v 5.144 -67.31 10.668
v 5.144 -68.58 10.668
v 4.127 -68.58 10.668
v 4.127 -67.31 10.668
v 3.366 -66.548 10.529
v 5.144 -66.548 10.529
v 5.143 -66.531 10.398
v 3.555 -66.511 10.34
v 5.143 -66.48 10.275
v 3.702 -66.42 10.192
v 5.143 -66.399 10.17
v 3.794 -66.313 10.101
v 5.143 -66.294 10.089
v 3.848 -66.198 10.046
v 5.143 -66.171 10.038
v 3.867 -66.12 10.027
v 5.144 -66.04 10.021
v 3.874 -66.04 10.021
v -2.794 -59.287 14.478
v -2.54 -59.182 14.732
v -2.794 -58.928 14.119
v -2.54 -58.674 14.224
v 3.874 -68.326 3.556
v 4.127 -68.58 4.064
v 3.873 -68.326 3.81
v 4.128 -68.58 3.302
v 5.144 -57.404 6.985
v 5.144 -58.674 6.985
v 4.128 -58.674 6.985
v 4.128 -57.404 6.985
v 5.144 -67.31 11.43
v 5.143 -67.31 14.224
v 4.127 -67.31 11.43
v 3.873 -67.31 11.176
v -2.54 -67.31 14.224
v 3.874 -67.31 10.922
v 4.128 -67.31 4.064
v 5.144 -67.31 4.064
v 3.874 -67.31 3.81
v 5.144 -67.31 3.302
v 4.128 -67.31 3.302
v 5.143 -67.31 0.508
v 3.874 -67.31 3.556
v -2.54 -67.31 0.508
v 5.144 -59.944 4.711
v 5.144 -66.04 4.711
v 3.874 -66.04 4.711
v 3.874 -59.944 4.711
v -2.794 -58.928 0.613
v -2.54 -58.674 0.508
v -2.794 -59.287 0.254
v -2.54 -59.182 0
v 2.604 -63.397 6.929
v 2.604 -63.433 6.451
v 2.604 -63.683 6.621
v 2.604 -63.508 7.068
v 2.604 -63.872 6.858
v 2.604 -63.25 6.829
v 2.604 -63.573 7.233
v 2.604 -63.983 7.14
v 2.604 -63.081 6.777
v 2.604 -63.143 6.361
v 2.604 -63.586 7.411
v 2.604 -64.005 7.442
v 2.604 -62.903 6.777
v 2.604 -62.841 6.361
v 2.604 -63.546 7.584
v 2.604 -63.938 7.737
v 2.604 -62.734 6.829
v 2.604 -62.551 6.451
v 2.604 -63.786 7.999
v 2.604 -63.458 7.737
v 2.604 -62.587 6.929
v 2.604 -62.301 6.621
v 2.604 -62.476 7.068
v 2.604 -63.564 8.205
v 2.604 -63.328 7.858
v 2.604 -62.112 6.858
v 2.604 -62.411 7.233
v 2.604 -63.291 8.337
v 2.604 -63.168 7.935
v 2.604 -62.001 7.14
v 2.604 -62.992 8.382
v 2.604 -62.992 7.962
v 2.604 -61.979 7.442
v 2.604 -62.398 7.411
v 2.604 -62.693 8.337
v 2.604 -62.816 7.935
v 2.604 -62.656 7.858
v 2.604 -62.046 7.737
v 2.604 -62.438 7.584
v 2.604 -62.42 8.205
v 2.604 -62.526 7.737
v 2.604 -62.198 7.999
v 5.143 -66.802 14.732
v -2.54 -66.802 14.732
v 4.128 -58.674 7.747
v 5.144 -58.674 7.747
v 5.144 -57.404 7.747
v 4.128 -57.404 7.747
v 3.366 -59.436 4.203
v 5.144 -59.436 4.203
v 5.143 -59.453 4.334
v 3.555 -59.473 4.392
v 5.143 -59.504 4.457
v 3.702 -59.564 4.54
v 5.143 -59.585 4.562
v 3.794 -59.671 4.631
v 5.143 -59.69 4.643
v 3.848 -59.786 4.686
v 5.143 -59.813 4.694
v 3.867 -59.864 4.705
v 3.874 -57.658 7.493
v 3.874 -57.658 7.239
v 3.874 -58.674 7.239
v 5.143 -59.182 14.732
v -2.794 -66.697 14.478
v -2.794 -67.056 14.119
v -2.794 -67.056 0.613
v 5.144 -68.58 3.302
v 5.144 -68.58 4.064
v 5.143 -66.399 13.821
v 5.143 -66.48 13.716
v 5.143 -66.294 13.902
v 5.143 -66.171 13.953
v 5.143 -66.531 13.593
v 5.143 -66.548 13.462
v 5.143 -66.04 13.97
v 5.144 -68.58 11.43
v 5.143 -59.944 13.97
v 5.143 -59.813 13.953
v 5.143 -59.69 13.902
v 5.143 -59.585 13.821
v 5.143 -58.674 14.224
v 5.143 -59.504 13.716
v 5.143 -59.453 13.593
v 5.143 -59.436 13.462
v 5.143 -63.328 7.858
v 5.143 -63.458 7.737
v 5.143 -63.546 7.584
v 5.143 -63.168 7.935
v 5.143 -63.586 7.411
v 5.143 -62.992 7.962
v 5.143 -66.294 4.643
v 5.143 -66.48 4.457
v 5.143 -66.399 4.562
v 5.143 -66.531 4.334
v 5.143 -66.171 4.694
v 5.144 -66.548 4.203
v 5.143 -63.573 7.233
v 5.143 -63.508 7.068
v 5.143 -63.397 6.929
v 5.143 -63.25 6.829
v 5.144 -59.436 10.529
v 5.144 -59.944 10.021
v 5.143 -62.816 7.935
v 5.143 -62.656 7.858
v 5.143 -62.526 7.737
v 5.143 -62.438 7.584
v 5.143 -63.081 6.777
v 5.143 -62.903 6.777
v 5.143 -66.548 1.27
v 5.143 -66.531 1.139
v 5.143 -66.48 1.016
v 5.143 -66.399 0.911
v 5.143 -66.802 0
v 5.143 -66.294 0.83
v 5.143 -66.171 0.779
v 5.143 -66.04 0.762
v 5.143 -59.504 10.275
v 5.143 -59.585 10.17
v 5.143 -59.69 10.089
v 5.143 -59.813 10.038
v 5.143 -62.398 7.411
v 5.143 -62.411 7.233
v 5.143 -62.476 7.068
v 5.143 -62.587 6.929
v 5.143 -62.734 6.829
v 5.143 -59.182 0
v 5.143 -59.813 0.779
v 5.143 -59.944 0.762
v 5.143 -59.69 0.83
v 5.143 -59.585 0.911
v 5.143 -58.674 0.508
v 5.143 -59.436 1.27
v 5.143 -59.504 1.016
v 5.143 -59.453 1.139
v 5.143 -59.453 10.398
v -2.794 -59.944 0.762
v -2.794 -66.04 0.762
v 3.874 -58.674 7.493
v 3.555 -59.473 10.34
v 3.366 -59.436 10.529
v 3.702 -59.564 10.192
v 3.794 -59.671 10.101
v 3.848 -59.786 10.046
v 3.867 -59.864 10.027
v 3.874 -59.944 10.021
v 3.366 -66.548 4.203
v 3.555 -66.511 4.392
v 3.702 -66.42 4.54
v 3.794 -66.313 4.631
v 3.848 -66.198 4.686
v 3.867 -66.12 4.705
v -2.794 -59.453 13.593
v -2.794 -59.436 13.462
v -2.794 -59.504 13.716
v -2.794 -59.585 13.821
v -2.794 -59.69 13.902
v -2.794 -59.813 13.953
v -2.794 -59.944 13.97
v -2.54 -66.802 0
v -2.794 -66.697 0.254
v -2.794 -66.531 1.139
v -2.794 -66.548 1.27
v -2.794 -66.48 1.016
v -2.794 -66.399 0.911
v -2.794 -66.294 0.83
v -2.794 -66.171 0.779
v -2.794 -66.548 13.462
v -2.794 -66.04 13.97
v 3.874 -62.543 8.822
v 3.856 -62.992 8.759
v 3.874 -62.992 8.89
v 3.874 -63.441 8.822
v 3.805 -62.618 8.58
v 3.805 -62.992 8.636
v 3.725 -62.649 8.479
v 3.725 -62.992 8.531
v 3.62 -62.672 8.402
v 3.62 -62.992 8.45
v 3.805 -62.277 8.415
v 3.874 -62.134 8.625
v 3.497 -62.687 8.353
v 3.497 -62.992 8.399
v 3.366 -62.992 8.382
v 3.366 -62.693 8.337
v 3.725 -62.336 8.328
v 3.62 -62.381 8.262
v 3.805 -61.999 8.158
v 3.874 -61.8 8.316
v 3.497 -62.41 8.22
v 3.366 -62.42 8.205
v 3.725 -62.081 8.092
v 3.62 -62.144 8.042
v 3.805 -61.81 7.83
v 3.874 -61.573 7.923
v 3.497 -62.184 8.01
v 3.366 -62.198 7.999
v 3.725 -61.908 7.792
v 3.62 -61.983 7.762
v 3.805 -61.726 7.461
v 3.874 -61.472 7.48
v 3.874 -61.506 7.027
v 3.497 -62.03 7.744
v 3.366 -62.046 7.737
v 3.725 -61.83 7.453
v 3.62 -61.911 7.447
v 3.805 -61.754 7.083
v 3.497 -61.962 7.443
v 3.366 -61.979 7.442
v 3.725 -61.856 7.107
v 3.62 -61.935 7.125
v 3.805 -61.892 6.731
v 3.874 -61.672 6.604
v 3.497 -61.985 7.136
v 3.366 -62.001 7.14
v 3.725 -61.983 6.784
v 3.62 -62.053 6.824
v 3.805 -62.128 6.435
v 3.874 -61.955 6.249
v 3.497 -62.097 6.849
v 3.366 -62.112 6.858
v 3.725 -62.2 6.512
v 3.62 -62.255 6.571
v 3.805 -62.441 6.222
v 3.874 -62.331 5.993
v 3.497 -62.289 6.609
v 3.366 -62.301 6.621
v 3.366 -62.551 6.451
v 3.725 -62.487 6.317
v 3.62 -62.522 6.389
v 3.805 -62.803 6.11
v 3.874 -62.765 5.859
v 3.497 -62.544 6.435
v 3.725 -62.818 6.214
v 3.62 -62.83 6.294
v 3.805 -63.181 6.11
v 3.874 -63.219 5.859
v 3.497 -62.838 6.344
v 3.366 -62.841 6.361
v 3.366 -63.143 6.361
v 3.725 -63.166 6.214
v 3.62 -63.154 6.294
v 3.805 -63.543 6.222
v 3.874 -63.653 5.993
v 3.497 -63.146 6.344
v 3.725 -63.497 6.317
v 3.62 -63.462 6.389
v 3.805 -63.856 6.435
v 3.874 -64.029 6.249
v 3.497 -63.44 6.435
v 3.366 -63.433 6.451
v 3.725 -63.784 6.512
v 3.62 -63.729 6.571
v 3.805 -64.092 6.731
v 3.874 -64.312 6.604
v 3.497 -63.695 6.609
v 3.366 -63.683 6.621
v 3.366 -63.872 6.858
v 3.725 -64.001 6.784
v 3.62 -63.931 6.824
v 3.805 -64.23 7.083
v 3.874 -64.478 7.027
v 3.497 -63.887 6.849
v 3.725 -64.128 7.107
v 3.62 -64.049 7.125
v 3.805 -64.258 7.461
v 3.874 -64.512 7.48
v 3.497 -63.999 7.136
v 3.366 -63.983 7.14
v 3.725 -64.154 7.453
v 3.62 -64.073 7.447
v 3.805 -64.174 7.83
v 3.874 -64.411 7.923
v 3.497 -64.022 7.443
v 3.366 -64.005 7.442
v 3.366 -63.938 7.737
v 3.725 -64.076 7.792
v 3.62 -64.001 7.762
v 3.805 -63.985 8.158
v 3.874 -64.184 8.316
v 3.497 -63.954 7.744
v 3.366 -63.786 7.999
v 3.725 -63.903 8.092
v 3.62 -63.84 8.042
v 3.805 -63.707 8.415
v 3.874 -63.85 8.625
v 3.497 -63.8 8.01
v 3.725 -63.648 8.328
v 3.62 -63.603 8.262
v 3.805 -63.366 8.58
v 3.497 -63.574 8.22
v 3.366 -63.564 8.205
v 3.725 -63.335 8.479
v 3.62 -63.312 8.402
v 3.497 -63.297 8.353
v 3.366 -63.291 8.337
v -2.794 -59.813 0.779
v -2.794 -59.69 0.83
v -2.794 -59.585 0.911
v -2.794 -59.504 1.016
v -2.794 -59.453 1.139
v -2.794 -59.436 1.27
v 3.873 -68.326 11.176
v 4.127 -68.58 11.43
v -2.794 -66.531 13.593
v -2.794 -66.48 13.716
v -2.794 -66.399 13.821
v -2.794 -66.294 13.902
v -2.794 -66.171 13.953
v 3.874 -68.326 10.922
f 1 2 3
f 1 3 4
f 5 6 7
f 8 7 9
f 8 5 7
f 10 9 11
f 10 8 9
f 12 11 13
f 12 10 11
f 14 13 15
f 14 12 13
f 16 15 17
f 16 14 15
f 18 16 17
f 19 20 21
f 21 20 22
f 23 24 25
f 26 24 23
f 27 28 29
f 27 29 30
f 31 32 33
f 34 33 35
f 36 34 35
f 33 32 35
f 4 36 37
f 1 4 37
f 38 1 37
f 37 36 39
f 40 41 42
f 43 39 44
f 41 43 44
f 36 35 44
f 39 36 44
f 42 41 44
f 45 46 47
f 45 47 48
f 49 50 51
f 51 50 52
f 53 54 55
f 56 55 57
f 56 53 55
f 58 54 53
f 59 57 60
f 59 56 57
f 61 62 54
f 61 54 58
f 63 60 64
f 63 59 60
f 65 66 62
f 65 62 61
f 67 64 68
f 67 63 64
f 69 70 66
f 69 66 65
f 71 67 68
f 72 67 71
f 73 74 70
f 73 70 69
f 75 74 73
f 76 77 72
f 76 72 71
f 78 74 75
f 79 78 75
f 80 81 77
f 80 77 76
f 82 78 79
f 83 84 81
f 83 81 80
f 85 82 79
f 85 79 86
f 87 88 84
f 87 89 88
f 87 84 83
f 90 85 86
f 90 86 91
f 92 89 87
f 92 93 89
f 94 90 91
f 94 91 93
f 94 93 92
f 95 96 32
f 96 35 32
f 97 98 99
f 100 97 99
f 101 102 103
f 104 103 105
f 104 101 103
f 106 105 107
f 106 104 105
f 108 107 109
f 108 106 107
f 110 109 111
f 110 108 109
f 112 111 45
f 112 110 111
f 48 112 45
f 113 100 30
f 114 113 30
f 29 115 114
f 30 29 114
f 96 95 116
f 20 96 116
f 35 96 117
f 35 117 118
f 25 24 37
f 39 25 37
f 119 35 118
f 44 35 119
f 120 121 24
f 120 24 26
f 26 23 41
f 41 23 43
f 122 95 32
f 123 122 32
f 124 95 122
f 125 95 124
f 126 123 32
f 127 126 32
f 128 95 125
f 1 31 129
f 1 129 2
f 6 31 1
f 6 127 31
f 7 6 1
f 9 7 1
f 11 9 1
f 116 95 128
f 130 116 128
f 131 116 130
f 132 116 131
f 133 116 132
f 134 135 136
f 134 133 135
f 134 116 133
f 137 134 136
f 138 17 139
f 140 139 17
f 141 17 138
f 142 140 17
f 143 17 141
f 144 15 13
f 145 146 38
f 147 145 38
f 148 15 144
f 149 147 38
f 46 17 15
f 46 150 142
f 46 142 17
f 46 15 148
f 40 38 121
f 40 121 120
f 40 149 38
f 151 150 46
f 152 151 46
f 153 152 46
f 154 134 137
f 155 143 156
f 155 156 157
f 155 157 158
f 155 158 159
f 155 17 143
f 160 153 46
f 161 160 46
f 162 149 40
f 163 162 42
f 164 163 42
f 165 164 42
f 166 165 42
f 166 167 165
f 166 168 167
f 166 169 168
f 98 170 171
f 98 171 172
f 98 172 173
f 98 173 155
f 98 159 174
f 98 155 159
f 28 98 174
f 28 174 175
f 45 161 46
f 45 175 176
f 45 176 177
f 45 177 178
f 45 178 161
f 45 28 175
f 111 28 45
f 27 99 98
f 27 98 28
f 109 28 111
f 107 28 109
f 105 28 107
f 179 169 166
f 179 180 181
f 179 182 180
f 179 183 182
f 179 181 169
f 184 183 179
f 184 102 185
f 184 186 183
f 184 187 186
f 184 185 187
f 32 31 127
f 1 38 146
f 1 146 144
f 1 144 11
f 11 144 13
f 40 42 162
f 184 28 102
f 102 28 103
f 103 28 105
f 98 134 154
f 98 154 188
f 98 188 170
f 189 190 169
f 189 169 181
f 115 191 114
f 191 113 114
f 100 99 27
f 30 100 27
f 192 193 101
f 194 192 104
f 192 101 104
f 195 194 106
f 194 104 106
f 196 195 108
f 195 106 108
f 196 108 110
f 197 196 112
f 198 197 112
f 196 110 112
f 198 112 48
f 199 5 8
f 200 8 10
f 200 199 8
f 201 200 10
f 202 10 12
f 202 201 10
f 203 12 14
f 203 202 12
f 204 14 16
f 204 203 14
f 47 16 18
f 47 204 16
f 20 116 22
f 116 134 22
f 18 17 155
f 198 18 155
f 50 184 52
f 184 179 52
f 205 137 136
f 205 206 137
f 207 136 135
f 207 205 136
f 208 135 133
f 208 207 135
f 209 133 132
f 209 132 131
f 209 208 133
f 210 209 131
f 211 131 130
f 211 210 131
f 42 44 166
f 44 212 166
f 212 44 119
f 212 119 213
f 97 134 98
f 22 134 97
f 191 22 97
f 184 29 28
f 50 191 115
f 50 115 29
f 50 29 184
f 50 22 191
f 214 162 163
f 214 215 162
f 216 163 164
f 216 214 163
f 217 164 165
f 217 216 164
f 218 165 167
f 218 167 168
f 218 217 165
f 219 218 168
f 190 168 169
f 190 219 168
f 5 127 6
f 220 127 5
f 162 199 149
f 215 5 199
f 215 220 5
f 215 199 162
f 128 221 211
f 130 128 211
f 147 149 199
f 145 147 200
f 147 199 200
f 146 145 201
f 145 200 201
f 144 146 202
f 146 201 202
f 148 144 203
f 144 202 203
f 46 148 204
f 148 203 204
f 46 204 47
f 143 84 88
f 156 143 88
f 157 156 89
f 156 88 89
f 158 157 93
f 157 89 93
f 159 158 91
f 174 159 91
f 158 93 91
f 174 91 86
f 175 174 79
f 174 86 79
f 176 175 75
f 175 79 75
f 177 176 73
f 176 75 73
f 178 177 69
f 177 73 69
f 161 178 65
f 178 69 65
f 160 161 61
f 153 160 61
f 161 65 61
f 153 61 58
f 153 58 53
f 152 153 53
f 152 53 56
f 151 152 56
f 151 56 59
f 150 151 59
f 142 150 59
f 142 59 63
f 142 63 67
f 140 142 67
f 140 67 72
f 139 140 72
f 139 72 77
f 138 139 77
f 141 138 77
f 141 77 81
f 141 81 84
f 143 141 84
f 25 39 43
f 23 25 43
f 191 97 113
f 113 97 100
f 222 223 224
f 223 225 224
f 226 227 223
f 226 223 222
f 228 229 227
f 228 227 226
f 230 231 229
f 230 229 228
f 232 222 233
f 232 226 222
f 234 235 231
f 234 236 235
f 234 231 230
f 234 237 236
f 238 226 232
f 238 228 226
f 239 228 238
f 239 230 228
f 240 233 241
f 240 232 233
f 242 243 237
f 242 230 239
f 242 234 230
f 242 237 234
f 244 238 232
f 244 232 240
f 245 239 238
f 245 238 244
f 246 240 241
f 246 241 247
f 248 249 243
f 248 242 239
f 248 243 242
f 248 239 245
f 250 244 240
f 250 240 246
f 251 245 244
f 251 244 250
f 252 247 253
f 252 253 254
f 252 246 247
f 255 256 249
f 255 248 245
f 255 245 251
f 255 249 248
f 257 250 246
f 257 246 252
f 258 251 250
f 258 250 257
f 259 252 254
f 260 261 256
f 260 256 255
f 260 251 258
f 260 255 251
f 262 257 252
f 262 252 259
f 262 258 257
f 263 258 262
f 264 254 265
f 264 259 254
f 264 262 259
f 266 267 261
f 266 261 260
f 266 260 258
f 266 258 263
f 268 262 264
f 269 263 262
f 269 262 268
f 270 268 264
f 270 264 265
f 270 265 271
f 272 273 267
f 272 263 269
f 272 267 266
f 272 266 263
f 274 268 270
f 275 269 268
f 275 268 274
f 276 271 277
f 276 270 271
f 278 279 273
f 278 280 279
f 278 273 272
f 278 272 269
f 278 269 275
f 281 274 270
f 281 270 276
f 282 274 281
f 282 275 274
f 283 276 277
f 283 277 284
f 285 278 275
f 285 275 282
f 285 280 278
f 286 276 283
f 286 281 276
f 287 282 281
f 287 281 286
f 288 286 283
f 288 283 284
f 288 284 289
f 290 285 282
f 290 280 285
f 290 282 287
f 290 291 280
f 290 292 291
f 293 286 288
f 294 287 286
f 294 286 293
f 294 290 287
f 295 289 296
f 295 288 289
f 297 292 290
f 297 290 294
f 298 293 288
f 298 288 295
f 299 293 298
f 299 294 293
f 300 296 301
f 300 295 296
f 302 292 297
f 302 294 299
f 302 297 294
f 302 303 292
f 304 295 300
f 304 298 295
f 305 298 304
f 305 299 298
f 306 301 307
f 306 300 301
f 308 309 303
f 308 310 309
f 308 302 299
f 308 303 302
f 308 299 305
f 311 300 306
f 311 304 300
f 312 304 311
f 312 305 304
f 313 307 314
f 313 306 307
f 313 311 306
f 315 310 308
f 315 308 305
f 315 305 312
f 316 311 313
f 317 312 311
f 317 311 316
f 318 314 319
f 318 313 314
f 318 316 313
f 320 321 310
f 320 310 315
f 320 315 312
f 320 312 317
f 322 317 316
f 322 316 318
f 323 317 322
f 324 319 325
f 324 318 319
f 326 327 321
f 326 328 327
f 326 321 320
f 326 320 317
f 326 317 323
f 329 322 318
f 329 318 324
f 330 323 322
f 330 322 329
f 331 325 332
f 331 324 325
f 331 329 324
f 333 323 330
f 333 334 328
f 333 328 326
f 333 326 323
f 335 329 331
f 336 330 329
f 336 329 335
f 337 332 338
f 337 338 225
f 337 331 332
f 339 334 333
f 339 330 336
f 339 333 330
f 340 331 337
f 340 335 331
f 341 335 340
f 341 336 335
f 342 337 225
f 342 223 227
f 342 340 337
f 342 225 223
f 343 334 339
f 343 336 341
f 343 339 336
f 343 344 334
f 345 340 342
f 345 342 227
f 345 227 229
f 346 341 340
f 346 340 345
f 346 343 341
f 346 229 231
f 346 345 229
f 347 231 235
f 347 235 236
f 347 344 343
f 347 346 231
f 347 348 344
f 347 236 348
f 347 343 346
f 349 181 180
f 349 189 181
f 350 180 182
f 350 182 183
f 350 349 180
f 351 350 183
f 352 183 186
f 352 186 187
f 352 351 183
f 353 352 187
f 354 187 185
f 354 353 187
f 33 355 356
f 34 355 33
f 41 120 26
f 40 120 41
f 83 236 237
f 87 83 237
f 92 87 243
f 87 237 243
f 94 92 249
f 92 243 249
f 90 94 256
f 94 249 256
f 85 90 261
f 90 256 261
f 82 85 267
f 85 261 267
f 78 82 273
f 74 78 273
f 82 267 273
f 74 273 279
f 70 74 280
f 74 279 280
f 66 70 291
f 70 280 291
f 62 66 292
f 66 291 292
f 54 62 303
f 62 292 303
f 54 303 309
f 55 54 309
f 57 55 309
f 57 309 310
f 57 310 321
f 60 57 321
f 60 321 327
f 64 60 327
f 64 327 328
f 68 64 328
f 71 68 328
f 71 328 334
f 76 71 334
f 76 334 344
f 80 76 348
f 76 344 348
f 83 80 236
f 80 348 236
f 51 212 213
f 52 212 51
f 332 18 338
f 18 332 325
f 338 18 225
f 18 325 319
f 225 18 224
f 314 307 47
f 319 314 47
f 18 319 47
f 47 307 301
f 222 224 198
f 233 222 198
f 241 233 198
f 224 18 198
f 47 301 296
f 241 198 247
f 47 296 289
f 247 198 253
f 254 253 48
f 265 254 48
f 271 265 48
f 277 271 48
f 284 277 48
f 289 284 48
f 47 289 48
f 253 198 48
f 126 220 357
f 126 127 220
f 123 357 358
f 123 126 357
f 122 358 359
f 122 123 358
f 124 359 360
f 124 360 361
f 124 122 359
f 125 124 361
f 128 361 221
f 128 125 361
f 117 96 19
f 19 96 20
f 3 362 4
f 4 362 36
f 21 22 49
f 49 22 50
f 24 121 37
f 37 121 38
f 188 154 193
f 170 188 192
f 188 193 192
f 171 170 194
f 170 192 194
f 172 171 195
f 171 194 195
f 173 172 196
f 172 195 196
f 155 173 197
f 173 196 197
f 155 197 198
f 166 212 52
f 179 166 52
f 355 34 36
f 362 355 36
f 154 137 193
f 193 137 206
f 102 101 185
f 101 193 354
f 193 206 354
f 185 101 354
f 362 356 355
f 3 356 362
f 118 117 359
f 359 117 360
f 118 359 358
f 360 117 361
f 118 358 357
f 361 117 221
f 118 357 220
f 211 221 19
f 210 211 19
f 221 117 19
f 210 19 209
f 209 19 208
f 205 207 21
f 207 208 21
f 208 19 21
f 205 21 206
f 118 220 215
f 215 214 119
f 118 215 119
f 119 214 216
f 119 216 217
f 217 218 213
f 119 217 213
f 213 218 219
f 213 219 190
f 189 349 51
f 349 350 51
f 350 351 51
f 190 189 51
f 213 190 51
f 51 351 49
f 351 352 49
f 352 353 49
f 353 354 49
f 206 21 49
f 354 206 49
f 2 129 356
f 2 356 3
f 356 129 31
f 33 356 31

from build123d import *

# Parameters (mm, degrees)
SKETCH2_W             = 14.732
SKETCH2_H             = 8.636
SKETCH2_W_2           = 13.208
SKETCH2_H_2           = 7.112
EXTRUDE_THIN1_DEPTH   = 7.9375
SKETCH3_W             = 14.732
SKETCH3_H             = 8.636
BOSS_EXTRUDE1_DEPTH   = 1.27
CUT_EXTRUDE1_REACH    = 9.938
SKETCH4_W             = 3.949
SKETCH4_H             = 7.112
SKETCH7_R             = 1.016
BOSS_EXTRUDE2_DEPTH   = 1.27
F_0_80_TAPPED_HOLE1_D = 1.19126
SKETCH9_W             = 0.762
SKETCH9_H             = 1.27
EXTRUDE_THIN2_DEPTH   = 1.27
FILLET1_R             = 0.508
CHAMFER1_SIZE         = 0.508
CHAMFER2_SIZE         = 0.254


with BuildPart() as part:
    # Sketch2 → Extrude-Thin1 (new body)
    with BuildSketch(Plane(origin=(-2.794, 0, 0), x_dir=(0, 0, -1), z_dir=(1, 0, 0))):
        with Locations((-7.366, -62.992)):
            Rectangle(SKETCH2_W, SKETCH2_H)
        with Locations((-7.366, -62.992)):
            Rectangle(SKETCH2_W_2, SKETCH2_H_2, mode=Mode.SUBTRACT)
    extrude(amount=EXTRUDE_THIN1_DEPTH)

    # Sketch3 → Boss-Extrude1 (add)
    with BuildSketch(Plane(origin=(5.1435, 0, 0), x_dir=(0, 0, -1), z_dir=(1, 0, 0))):
        with Locations((-7.366, -62.992)):
            Rectangle(SKETCH3_W, SKETCH3_H)
    extrude(amount=-BOSS_EXTRUDE1_DEPTH)

    # Sketch4 → Cut-Extrude1 (cut, up to next)
    with BuildSketch(Plane(origin=(5.1435, 0, 0), x_dir=(0, 0, -1), z_dir=(1, 0, 0)), mode=Mode.PRIVATE) as cut_extrude1_sk1:
        with Locations((-2.7365, -62.992)):
            Rectangle(SKETCH4_W, SKETCH4_H)
    cut_extrude1_tool1 = extrude(cut_extrude1_sk1.sketch, amount=-CUT_EXTRUDE1_REACH, mode=Mode.PRIVATE) & part.part
    add(cut_extrude1_tool1.solids().sort_by_distance((5.1435, -62.992, 2.7365))[0], mode=Mode.SUBTRACT)
    # Sketch4 → Cut-Extrude1 (cut, up to next)
    with BuildSketch(Plane(origin=(5.1435, 0, 0), x_dir=(0, 0, -1), z_dir=(1, 0, 0)), mode=Mode.PRIVATE) as cut_extrude1_sk2:
        with Locations((-11.9955, -62.992)):
            Rectangle(SKETCH4_W, SKETCH4_H)
    cut_extrude1_tool2 = extrude(cut_extrude1_sk2.sketch, amount=-CUT_EXTRUDE1_REACH, mode=Mode.PRIVATE) & part.part
    add(cut_extrude1_tool2.solids().sort_by_distance((5.1435, -62.992, 11.9955))[0], mode=Mode.SUBTRACT)

    # Sketch7 → Boss-Extrude2 (add)
    with BuildSketch(Plane.ZY.offset(-3.8735)):
        with Locations((7.366, -62.992)):
            Circle(SKETCH7_R)
    extrude(amount=BOSS_EXTRUDE2_DEPTH)

    # #0-80 Tapped Hole1 (through all)
    with Locations(Plane(origin=(5.1435, 0, 0), x_dir=(0, 0, -1), z_dir=(1, 0, 0))):
        with Locations((-7.366, -62.992)):
            Hole(F_0_80_TAPPED_HOLE1_D / 2)

    # Sketch9 → Extrude-Thin2 (add)
    with BuildSketch(Plane(origin=(5.1435, 0, 0), x_dir=(0, 0, -1), z_dir=(1, 0, 0))):
        with Locations((-7.366, -58.039)):
            Rectangle(SKETCH9_W, SKETCH9_H)
        with Locations((-11.049, -67.945)):
            Rectangle(SKETCH9_W, SKETCH9_H)
        with Locations((-3.683, -67.945)):
            Rectangle(SKETCH9_W, SKETCH9_H)
    extrude(amount=-EXTRUDE_THIN2_DEPTH)

    # Fillet1
    fillet1_edges = [part.edges().sort_by_distance(p)[0] for p in [
        (3.8735, -66.548, 7.366),
        (1.17475, -59.436, 13.97),
        (1.17475, -59.436, 0.762),
        (1.17475, -66.548, 0.762),
        (3.8735, -59.436, 7.366),
        (1.17475, -66.548, 13.97),
        (4.5085, -59.436, 10.021),
        (4.5085, -59.436, 4.711),
        (4.5085, -66.548, 4.711),
        (4.5085, -66.548, 10.021),
        (3.8735, -62.992, 6.35),
    ]]
    fillet(fillet1_edges, radius=FILLET1_R)

    # Chamfer1
    chamfer1_edges = [part.edges().sort_by_distance(p)[0] for p in [
        (1.17475, -67.31, 14.732),
        (1.17475, -67.31, 0),
        (1.17475, -58.674, 0),
        (1.17475, -58.674, 14.732),
    ]]
    chamfer(chamfer1_edges, length=CHAMFER1_SIZE)

    # Chamfer2
    chamfer2_edges = [part.edges().sort_by_distance(p)[0] for p in [
        (-2.794, -67.056, 14.478),
        (-2.794, -67.31, 7.366),
        (-2.794, -67.056, 0.254),
        (-2.794, -62.992, 0),
        (-2.794, -58.928, 0.254),
        (-2.794, -62.992, 14.732),
        (-2.794, -58.928, 14.478),
        (-2.794, -58.674, 7.366),
        (3.8735, -58.039, 6.985),
        (3.8735, -57.404, 7.366),
        (3.8735, -58.039, 7.747),
        (3.8735, -67.945, 10.668),
        (3.8735, -68.58, 11.049),
        (3.8735, -67.945, 11.43),
        (3.8735, -67.945, 3.302),
        (3.8735, -68.58, 3.683),
        (3.8735, -67.945, 4.064),
    ]]
    chamfer(chamfer2_edges, length=CHAMFER2_SIZE)


solid = part.part
